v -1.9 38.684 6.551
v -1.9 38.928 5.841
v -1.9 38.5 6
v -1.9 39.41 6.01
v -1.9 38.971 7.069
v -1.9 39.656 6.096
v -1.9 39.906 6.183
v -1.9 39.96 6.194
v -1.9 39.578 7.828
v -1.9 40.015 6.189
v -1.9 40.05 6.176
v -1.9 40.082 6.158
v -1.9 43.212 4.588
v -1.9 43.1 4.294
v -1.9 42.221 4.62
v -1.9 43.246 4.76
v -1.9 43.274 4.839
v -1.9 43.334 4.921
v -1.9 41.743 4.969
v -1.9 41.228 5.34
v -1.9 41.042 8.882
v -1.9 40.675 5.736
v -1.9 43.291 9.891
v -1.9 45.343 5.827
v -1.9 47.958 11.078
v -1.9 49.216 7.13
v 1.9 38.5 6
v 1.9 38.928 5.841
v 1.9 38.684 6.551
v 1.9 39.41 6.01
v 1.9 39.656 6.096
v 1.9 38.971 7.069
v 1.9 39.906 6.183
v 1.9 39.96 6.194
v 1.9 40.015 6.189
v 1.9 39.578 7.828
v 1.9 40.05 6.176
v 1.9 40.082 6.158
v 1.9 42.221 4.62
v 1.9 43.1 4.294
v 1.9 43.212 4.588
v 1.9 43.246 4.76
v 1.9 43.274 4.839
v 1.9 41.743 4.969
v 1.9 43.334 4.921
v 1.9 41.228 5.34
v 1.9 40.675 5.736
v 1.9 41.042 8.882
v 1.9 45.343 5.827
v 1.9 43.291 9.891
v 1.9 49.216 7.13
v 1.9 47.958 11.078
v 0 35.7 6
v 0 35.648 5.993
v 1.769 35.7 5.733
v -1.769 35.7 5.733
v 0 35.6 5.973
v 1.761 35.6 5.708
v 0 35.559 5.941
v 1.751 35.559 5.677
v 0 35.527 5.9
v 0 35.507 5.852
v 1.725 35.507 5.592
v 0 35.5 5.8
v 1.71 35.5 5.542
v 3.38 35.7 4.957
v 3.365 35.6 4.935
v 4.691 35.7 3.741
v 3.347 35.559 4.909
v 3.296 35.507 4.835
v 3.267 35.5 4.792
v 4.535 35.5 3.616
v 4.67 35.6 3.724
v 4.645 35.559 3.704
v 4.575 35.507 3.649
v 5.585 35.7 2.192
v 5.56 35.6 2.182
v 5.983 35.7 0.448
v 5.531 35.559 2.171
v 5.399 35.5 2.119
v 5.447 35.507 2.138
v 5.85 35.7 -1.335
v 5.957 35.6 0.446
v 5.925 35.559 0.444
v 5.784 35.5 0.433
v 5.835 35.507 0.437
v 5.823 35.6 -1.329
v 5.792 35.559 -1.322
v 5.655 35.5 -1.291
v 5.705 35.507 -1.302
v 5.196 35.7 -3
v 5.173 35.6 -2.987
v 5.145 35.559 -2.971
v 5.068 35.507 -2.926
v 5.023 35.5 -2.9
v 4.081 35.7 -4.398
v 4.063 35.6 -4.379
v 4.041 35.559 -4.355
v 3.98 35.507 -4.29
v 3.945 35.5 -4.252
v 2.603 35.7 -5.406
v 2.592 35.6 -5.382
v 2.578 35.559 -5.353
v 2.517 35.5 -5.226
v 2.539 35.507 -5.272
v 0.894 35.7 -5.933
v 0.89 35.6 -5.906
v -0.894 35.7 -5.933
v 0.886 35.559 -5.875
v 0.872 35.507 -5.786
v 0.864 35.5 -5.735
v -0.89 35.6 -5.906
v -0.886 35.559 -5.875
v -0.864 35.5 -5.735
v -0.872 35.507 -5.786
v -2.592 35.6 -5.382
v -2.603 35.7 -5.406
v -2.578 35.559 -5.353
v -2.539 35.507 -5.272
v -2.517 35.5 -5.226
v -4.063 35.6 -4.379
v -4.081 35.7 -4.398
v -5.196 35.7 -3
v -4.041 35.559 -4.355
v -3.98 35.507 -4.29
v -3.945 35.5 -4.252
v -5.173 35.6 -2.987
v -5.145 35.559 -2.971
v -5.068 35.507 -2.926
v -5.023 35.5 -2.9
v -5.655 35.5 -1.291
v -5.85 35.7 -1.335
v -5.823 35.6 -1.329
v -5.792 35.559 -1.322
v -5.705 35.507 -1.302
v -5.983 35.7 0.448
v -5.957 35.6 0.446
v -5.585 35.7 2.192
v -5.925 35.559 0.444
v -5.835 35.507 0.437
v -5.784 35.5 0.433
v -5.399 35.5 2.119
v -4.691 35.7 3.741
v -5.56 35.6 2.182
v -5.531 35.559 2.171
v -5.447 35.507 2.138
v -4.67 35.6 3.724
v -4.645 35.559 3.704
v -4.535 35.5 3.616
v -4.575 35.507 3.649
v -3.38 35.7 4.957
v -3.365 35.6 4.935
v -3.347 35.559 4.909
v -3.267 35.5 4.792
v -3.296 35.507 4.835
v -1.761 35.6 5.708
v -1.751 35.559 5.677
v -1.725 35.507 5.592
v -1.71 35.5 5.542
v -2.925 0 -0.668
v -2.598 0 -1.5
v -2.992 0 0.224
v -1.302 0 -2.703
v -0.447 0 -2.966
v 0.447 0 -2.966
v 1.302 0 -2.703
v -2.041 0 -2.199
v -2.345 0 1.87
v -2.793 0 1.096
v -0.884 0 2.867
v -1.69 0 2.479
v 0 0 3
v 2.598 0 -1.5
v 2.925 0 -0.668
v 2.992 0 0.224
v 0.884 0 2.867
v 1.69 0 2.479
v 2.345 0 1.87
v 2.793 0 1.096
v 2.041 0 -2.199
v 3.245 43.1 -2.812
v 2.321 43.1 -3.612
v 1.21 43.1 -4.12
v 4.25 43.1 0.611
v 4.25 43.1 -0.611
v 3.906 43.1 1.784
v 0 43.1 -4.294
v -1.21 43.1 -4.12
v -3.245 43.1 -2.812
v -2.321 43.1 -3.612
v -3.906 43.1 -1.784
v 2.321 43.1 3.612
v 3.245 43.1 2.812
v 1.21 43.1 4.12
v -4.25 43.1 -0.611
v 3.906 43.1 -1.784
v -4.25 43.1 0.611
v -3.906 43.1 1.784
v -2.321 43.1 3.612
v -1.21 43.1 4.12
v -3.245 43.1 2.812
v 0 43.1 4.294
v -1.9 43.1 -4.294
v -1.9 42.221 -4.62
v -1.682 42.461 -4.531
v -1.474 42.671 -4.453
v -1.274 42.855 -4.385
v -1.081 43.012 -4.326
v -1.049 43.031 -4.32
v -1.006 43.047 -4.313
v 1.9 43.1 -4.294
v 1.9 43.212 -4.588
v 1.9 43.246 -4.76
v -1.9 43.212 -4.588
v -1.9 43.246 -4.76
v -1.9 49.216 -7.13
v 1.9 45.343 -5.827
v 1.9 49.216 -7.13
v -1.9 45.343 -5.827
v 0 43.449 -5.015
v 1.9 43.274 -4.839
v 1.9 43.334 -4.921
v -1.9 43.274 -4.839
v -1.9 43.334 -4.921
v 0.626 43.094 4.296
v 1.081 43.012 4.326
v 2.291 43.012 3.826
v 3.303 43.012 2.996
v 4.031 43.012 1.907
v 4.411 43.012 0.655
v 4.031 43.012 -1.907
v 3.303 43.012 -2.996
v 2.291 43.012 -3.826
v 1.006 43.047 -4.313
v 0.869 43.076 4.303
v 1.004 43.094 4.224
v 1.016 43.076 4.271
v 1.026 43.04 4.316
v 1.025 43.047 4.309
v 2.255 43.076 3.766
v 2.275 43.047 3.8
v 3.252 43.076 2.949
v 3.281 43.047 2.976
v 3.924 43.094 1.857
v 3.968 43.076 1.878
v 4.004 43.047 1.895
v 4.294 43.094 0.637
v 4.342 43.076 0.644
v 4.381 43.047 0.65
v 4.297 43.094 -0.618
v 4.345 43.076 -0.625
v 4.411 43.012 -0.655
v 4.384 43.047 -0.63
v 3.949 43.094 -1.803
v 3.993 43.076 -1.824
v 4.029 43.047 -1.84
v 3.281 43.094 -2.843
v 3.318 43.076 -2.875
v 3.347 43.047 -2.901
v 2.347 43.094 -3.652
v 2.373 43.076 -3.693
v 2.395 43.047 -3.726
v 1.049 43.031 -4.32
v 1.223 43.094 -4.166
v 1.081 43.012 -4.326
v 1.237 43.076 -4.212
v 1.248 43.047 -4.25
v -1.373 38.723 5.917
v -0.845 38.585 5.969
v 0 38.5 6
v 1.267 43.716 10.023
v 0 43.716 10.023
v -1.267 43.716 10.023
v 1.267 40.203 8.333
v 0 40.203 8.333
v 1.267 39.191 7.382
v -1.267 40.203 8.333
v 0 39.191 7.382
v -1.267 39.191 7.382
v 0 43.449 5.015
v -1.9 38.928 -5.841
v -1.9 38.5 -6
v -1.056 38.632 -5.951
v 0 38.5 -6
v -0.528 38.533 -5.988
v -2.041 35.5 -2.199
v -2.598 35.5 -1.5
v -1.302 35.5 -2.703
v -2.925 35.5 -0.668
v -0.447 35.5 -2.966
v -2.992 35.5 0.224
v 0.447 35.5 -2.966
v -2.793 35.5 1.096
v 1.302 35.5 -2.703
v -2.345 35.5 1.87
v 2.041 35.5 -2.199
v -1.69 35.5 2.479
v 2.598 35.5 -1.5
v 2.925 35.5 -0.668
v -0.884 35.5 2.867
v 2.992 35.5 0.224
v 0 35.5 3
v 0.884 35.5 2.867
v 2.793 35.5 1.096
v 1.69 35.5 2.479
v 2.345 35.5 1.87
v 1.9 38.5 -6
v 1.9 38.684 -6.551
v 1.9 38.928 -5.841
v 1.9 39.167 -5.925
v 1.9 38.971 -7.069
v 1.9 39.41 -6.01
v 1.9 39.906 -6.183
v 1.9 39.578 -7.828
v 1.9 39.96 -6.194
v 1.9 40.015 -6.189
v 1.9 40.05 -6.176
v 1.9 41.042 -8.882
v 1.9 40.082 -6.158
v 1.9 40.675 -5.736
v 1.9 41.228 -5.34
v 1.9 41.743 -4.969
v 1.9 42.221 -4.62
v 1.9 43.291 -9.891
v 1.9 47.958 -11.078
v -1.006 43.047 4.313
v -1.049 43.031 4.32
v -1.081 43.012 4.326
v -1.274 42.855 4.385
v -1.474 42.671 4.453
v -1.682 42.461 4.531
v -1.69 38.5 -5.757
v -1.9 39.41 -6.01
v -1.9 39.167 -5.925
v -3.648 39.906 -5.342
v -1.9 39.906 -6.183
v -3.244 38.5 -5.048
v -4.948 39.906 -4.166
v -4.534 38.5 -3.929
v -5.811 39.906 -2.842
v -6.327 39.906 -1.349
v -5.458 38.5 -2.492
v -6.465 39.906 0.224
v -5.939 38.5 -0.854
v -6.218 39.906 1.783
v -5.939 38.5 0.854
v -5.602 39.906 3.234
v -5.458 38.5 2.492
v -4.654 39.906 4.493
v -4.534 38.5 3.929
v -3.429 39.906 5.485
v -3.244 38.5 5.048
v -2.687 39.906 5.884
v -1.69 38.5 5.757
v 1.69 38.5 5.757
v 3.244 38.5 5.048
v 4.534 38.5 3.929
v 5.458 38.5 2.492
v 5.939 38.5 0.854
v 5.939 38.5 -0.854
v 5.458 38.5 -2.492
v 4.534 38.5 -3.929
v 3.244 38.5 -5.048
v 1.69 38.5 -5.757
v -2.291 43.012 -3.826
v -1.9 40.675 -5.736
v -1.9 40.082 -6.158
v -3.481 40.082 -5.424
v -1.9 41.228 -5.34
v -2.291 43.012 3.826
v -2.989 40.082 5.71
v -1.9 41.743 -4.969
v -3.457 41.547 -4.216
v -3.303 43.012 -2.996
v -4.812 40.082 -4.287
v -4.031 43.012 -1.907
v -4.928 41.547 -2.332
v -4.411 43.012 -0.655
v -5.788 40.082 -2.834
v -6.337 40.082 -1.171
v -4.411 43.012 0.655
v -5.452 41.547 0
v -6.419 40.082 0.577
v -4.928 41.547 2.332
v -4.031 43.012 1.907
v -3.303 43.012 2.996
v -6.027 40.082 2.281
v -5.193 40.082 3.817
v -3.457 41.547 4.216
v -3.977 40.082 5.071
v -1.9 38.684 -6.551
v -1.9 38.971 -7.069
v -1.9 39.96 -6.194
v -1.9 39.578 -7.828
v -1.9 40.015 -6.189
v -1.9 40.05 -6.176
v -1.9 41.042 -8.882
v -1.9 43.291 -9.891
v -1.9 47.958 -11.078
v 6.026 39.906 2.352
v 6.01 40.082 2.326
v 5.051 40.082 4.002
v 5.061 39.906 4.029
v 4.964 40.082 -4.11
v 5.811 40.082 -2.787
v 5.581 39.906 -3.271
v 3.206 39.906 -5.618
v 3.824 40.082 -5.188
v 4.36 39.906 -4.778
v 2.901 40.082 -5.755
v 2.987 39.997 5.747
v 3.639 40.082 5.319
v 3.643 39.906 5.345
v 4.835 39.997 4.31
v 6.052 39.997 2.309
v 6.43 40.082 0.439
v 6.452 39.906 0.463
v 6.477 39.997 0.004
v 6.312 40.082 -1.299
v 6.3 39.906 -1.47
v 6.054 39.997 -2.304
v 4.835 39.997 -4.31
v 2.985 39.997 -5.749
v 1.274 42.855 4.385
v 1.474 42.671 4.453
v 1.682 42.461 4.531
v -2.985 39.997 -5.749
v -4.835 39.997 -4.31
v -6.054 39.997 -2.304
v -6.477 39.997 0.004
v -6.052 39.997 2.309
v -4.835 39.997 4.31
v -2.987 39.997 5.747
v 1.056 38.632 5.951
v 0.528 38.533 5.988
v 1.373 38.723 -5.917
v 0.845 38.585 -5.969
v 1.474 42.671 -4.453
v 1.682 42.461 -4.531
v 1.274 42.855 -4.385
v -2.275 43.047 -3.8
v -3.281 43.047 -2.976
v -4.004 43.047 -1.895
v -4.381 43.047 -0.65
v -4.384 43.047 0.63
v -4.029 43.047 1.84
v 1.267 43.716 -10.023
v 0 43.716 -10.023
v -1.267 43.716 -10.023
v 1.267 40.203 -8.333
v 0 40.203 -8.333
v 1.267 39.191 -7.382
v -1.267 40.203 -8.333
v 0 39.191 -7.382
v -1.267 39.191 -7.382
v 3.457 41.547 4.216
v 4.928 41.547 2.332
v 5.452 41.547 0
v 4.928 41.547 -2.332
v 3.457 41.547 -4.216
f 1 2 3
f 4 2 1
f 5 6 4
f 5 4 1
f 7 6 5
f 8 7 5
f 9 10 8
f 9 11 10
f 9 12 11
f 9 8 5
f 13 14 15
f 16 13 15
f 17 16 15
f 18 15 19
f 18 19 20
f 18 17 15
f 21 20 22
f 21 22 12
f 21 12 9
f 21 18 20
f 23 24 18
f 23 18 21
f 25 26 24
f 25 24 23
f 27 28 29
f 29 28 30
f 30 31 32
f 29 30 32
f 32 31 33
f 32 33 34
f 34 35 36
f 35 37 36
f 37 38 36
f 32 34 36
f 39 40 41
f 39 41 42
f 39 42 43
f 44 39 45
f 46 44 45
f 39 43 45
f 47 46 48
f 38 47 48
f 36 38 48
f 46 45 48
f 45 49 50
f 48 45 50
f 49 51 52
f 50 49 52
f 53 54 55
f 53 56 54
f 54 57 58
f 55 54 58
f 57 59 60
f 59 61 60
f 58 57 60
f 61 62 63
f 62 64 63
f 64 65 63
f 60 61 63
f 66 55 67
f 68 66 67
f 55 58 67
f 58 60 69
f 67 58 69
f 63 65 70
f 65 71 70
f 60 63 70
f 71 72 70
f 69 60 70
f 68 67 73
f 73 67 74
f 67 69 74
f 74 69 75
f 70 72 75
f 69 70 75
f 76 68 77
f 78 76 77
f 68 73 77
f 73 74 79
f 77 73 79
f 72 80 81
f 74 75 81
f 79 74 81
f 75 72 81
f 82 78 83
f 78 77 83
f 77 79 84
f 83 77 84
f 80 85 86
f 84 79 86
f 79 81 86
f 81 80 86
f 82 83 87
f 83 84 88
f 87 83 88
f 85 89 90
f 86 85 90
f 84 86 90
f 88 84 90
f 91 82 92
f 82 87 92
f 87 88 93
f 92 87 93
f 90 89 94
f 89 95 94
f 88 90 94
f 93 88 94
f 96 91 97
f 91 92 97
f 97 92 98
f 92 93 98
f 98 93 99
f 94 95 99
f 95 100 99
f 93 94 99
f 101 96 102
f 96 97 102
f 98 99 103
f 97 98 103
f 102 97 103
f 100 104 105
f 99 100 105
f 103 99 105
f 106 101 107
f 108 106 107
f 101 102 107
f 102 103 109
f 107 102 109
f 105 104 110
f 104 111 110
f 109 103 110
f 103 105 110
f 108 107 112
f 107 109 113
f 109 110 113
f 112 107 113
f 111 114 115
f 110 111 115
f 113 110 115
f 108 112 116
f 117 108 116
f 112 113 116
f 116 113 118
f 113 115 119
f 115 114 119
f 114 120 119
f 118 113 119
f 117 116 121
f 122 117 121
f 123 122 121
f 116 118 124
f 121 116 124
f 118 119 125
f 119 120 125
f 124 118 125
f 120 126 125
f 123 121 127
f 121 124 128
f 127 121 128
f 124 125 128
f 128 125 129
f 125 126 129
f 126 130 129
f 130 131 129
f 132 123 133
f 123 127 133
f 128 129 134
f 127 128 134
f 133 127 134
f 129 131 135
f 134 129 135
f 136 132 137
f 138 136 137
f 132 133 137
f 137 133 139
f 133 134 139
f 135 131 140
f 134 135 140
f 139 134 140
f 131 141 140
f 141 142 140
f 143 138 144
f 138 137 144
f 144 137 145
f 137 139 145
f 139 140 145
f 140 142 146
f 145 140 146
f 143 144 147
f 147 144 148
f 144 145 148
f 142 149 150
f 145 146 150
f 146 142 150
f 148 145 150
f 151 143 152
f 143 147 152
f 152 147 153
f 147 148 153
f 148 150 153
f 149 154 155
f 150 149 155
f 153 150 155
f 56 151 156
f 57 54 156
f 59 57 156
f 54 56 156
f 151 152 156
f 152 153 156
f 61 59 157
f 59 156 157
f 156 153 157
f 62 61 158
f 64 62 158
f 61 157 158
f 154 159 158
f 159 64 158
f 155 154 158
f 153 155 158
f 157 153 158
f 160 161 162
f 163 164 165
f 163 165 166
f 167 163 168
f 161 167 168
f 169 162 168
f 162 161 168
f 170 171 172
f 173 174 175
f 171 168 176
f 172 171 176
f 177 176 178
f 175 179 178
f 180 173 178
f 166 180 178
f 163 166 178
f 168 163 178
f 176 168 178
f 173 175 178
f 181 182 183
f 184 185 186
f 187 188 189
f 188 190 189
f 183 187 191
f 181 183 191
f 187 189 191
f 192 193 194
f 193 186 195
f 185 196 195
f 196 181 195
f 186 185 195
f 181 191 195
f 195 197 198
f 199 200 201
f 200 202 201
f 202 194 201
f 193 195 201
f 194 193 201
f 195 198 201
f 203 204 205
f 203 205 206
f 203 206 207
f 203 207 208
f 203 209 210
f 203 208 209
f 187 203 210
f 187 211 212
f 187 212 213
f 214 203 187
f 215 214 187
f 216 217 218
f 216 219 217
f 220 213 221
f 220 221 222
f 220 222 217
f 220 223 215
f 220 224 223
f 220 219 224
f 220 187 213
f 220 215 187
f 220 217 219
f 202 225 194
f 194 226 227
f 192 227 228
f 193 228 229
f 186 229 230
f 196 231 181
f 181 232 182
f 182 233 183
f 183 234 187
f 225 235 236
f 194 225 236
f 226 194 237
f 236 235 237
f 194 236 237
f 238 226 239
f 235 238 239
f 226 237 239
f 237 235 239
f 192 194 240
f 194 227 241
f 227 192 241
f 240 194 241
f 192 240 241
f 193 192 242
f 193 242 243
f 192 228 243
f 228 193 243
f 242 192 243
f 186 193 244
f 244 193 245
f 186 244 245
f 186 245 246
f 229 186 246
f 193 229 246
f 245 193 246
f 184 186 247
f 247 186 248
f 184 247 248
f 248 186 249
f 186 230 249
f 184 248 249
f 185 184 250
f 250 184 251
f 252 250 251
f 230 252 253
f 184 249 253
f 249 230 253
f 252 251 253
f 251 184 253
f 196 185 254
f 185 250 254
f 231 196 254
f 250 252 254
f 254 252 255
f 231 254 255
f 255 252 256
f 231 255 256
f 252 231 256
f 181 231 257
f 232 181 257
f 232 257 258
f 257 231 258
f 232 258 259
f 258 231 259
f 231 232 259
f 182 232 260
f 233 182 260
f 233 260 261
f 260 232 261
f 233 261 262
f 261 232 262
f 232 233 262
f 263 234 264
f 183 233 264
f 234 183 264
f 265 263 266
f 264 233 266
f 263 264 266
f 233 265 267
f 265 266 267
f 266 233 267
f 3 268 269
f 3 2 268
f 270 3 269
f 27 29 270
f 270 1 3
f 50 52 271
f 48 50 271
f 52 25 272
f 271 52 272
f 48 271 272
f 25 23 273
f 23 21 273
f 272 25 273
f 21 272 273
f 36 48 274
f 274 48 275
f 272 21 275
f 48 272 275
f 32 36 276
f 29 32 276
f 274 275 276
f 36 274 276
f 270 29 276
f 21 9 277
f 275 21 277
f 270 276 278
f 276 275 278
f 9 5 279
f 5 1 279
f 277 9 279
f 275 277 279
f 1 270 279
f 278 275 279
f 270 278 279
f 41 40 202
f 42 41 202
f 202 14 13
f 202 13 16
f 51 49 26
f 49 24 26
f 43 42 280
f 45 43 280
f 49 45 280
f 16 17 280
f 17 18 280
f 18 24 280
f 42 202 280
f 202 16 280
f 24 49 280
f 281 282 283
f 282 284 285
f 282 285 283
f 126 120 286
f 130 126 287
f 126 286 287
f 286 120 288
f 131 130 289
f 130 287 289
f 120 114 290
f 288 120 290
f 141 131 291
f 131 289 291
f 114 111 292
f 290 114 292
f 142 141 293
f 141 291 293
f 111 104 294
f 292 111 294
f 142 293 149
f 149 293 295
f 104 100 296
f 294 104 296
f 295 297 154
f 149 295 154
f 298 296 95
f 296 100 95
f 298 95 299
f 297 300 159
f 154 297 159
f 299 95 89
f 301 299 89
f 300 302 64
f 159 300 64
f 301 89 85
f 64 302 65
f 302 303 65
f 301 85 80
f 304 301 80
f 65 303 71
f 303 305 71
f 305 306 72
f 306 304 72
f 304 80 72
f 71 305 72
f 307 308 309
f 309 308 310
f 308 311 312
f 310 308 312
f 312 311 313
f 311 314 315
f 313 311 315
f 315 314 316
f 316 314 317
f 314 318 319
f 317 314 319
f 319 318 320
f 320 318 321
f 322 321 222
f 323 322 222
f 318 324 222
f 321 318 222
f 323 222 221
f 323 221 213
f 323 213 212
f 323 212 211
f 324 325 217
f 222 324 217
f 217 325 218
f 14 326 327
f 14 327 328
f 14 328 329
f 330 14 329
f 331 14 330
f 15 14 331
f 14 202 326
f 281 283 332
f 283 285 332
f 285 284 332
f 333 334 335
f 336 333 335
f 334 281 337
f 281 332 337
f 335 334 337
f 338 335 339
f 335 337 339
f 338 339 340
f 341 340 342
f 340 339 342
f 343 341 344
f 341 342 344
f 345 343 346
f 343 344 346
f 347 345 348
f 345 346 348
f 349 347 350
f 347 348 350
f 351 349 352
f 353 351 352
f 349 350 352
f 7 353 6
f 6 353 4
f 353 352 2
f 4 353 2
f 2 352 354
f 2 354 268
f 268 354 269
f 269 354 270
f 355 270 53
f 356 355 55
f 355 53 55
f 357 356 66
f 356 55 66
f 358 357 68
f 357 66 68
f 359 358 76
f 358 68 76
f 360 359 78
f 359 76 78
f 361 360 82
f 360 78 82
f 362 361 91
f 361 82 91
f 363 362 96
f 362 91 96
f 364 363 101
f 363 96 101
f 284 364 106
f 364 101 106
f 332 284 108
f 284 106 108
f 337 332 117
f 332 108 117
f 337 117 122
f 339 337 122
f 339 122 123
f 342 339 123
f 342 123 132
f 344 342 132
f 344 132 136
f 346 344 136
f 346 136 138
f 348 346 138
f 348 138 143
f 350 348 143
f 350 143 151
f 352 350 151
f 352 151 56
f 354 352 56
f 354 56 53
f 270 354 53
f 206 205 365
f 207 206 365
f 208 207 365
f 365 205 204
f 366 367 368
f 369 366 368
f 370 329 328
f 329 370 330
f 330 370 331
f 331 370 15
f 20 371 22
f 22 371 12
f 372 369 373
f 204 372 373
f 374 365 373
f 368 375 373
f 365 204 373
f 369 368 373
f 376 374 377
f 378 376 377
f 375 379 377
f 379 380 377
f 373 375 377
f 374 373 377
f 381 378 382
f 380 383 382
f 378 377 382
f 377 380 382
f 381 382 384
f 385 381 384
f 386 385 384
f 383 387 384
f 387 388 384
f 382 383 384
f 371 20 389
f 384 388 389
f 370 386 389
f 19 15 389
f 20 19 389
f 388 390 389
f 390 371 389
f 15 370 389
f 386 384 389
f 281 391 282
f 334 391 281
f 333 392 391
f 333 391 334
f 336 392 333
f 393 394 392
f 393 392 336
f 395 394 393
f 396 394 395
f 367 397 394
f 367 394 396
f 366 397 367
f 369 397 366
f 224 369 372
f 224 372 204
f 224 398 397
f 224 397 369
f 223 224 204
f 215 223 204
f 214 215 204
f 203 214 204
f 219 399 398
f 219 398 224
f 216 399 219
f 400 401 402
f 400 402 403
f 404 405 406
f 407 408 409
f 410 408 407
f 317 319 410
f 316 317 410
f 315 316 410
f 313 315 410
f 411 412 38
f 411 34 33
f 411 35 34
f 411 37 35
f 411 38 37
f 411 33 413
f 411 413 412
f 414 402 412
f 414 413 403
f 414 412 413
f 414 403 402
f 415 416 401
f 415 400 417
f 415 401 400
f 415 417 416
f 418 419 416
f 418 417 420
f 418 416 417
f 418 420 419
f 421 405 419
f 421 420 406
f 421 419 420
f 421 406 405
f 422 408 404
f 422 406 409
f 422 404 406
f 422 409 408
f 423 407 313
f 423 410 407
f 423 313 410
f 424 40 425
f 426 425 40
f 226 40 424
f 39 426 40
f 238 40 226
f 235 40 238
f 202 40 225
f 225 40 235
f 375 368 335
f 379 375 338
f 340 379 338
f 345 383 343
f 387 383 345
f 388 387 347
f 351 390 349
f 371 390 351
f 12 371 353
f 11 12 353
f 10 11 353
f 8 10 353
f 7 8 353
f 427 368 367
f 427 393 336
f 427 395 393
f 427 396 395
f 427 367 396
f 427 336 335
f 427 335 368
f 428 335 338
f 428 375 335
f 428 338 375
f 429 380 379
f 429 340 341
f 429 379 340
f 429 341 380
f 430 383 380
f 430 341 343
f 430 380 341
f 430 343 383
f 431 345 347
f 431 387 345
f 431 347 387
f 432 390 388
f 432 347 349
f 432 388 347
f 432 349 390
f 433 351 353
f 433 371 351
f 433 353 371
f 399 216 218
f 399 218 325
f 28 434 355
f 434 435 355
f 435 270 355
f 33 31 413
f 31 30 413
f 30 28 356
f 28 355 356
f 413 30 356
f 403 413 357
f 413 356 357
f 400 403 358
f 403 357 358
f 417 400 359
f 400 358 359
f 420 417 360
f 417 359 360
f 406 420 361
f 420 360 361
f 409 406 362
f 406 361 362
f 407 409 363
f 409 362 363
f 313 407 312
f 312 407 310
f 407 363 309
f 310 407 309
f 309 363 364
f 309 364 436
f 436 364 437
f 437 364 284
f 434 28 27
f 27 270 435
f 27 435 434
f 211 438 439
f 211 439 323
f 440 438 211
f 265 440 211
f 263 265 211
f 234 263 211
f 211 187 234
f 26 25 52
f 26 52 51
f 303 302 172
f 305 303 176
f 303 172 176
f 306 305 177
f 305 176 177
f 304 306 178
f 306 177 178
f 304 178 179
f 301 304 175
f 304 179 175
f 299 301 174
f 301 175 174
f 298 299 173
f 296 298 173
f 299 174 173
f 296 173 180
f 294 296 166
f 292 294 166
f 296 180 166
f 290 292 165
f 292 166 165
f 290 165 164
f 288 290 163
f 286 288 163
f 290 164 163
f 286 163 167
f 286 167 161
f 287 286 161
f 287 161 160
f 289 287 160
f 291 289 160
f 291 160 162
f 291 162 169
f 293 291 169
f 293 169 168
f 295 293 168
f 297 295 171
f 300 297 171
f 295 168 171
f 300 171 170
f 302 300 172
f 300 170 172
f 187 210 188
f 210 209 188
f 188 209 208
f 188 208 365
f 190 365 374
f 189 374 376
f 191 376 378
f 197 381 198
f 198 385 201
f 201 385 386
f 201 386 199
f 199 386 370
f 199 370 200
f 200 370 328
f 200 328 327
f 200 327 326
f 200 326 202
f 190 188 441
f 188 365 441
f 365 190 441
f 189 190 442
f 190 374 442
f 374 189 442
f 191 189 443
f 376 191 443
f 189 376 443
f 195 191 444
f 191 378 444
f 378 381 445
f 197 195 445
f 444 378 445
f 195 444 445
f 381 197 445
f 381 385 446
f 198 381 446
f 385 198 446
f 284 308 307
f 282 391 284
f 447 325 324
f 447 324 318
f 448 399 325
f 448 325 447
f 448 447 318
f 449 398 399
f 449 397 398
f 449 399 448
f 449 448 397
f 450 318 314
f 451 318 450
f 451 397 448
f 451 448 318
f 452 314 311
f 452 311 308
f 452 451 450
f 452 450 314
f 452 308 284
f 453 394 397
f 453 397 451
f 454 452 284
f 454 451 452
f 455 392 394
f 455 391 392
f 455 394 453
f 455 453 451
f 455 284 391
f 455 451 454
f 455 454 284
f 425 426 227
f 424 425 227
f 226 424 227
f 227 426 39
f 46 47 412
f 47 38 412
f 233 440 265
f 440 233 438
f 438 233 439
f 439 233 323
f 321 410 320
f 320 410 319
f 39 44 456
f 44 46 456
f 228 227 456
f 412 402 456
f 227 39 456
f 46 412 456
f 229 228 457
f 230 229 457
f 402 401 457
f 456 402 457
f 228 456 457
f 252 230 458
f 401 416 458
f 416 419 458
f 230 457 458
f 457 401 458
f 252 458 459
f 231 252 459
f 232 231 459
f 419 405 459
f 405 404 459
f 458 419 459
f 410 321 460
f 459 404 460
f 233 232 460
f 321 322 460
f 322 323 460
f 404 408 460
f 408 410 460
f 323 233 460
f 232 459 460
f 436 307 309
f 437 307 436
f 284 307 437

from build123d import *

# Parameters (mm, degrees)
SKETCH_1_R           = 3
EXTRUDE_1_DEPTH      = 35.5
SKETCH_2_R           = 6
EXTRUDE_2_DEPTH      = 3
FILLET_1_R           = 0.2
EXTRUDE_3_DEPTH      = 1.9
EXTRUDE_3_DEPTH_BACK = 1.9


with BuildPart() as part:
    # 스케치1 → 보스-돌출1 (new body)
    with BuildSketch(Plane(origin=(0, 0, 0), x_dir=(1, 0, 0), z_dir=(0, 1, 0))):
        Circle(SKETCH_1_R)
    extrude(amount=EXTRUDE_1_DEPTH)

    # 스케치2 → 보스-돌출2 (add)
    with BuildSketch(Plane(origin=(0, 35.5, 0), x_dir=(1, 0, 0), z_dir=(0, 1, 0))):
        Circle(SKETCH_2_R)
    extrude(amount=EXTRUDE_2_DEPTH)

    # 스케치3 → 회전1 (revolve)
    with BuildSketch(Plane(origin=(0, 0, 0), x_dir=(0, 0, -1), z_dir=(1, 0, 0))):
        Polygon((0, 43.1), (4.4, 43.1), (6.5, 40), (6, 38.5), (0, 38.5), align=None)
    revolve(axis=Axis((0, 38.5, 0), (0, 1, 0)))

    # 필렛1
    fillet_1_edges = [part.edges().sort_by_distance(p)[0] for p in [
        (0, 43.1, 4.4),
        (0, 40, 6.5),
        (-6, 35.5, 0),
    ]]
    fillet(fillet_1_edges, radius=FILLET_1_R)

    # 스케치4 → 보스-돌출3 (add, two sides: drawn at the far end of the back side and taken through both)
    with BuildSketch(Plane(origin=(0, 0, 0), x_dir=(0, 0, -1), z_dir=(1, 0, 0)).offset(-EXTRUDE_3_DEPTH_BACK)):
        with BuildLine():
            Line((7.129672899, 49.216052305), (11.078140475, 47.958388396))
            add(Edge.make_bspline(
                [(11.078140475, 47.958388396), (10.847677477, 46.568474241), (10.449817168, 45.302296098), (9.907358884, 43.260826265), (9.311295548, 41.6663192), (8.235465928, 40.02121413), (7.619812039, 39.286169598), (6.4951686, 38.593529849), (6, 38.5)],
                knots=[0, 0, 0, 0, 0.303156728, 0.355873298, 0.527165706, 0.682347727, 0.853387488, 1, 1, 1, 1], degree=3))
            Line((6, 38.5), (4.293914255, 43.1))
            add(Edge.make_bspline(
                [(4.293914255, 43.1), (4.703822543, 43.319985303), (4.99322637, 42.768371987), (6.293739819, 46.611799248), (7.129672899, 49.216052305)],
                knots=[0, 0, 0, 0, 0.337975892, 1, 1, 1, 1], degree=3))
        make_face()
        with BuildLine():
            Line((-4.293914255, 43.1), (-6, 38.5))
            add(Edge.make_bspline(
                [(-11.078140475, 47.958388396), (-10.847677477, 46.568474241), (-10.449817168, 45.302296098), (-9.907358884, 43.260826265), (-9.311295548, 41.6663192), (-8.235465928, 40.02121413), (-7.619812039, 39.286169598), (-6.4951686, 38.593529849), (-6, 38.5)],
                knots=[0, 0, 0, 0, 0.303156728, 0.355873298, 0.527165706, 0.682347727, 0.853387488, 1, 1, 1, 1], degree=3))
            Line((-11.078140475, 47.958388396), (-7.129672899, 49.216052305))
            add(Edge.make_bspline(
                [(-4.293914255, 43.1), (-4.703822543, 43.319985303), (-4.99322637, 42.768371987), (-6.293739819, 46.611799248), (-7.129672899, 49.216052305)],
                knots=[0, 0, 0, 0, 0.337975892, 1, 1, 1, 1], degree=3))
        make_face()
    extrude(amount=EXTRUDE_3_DEPTH + EXTRUDE_3_DEPTH_BACK)


solid = part.part
